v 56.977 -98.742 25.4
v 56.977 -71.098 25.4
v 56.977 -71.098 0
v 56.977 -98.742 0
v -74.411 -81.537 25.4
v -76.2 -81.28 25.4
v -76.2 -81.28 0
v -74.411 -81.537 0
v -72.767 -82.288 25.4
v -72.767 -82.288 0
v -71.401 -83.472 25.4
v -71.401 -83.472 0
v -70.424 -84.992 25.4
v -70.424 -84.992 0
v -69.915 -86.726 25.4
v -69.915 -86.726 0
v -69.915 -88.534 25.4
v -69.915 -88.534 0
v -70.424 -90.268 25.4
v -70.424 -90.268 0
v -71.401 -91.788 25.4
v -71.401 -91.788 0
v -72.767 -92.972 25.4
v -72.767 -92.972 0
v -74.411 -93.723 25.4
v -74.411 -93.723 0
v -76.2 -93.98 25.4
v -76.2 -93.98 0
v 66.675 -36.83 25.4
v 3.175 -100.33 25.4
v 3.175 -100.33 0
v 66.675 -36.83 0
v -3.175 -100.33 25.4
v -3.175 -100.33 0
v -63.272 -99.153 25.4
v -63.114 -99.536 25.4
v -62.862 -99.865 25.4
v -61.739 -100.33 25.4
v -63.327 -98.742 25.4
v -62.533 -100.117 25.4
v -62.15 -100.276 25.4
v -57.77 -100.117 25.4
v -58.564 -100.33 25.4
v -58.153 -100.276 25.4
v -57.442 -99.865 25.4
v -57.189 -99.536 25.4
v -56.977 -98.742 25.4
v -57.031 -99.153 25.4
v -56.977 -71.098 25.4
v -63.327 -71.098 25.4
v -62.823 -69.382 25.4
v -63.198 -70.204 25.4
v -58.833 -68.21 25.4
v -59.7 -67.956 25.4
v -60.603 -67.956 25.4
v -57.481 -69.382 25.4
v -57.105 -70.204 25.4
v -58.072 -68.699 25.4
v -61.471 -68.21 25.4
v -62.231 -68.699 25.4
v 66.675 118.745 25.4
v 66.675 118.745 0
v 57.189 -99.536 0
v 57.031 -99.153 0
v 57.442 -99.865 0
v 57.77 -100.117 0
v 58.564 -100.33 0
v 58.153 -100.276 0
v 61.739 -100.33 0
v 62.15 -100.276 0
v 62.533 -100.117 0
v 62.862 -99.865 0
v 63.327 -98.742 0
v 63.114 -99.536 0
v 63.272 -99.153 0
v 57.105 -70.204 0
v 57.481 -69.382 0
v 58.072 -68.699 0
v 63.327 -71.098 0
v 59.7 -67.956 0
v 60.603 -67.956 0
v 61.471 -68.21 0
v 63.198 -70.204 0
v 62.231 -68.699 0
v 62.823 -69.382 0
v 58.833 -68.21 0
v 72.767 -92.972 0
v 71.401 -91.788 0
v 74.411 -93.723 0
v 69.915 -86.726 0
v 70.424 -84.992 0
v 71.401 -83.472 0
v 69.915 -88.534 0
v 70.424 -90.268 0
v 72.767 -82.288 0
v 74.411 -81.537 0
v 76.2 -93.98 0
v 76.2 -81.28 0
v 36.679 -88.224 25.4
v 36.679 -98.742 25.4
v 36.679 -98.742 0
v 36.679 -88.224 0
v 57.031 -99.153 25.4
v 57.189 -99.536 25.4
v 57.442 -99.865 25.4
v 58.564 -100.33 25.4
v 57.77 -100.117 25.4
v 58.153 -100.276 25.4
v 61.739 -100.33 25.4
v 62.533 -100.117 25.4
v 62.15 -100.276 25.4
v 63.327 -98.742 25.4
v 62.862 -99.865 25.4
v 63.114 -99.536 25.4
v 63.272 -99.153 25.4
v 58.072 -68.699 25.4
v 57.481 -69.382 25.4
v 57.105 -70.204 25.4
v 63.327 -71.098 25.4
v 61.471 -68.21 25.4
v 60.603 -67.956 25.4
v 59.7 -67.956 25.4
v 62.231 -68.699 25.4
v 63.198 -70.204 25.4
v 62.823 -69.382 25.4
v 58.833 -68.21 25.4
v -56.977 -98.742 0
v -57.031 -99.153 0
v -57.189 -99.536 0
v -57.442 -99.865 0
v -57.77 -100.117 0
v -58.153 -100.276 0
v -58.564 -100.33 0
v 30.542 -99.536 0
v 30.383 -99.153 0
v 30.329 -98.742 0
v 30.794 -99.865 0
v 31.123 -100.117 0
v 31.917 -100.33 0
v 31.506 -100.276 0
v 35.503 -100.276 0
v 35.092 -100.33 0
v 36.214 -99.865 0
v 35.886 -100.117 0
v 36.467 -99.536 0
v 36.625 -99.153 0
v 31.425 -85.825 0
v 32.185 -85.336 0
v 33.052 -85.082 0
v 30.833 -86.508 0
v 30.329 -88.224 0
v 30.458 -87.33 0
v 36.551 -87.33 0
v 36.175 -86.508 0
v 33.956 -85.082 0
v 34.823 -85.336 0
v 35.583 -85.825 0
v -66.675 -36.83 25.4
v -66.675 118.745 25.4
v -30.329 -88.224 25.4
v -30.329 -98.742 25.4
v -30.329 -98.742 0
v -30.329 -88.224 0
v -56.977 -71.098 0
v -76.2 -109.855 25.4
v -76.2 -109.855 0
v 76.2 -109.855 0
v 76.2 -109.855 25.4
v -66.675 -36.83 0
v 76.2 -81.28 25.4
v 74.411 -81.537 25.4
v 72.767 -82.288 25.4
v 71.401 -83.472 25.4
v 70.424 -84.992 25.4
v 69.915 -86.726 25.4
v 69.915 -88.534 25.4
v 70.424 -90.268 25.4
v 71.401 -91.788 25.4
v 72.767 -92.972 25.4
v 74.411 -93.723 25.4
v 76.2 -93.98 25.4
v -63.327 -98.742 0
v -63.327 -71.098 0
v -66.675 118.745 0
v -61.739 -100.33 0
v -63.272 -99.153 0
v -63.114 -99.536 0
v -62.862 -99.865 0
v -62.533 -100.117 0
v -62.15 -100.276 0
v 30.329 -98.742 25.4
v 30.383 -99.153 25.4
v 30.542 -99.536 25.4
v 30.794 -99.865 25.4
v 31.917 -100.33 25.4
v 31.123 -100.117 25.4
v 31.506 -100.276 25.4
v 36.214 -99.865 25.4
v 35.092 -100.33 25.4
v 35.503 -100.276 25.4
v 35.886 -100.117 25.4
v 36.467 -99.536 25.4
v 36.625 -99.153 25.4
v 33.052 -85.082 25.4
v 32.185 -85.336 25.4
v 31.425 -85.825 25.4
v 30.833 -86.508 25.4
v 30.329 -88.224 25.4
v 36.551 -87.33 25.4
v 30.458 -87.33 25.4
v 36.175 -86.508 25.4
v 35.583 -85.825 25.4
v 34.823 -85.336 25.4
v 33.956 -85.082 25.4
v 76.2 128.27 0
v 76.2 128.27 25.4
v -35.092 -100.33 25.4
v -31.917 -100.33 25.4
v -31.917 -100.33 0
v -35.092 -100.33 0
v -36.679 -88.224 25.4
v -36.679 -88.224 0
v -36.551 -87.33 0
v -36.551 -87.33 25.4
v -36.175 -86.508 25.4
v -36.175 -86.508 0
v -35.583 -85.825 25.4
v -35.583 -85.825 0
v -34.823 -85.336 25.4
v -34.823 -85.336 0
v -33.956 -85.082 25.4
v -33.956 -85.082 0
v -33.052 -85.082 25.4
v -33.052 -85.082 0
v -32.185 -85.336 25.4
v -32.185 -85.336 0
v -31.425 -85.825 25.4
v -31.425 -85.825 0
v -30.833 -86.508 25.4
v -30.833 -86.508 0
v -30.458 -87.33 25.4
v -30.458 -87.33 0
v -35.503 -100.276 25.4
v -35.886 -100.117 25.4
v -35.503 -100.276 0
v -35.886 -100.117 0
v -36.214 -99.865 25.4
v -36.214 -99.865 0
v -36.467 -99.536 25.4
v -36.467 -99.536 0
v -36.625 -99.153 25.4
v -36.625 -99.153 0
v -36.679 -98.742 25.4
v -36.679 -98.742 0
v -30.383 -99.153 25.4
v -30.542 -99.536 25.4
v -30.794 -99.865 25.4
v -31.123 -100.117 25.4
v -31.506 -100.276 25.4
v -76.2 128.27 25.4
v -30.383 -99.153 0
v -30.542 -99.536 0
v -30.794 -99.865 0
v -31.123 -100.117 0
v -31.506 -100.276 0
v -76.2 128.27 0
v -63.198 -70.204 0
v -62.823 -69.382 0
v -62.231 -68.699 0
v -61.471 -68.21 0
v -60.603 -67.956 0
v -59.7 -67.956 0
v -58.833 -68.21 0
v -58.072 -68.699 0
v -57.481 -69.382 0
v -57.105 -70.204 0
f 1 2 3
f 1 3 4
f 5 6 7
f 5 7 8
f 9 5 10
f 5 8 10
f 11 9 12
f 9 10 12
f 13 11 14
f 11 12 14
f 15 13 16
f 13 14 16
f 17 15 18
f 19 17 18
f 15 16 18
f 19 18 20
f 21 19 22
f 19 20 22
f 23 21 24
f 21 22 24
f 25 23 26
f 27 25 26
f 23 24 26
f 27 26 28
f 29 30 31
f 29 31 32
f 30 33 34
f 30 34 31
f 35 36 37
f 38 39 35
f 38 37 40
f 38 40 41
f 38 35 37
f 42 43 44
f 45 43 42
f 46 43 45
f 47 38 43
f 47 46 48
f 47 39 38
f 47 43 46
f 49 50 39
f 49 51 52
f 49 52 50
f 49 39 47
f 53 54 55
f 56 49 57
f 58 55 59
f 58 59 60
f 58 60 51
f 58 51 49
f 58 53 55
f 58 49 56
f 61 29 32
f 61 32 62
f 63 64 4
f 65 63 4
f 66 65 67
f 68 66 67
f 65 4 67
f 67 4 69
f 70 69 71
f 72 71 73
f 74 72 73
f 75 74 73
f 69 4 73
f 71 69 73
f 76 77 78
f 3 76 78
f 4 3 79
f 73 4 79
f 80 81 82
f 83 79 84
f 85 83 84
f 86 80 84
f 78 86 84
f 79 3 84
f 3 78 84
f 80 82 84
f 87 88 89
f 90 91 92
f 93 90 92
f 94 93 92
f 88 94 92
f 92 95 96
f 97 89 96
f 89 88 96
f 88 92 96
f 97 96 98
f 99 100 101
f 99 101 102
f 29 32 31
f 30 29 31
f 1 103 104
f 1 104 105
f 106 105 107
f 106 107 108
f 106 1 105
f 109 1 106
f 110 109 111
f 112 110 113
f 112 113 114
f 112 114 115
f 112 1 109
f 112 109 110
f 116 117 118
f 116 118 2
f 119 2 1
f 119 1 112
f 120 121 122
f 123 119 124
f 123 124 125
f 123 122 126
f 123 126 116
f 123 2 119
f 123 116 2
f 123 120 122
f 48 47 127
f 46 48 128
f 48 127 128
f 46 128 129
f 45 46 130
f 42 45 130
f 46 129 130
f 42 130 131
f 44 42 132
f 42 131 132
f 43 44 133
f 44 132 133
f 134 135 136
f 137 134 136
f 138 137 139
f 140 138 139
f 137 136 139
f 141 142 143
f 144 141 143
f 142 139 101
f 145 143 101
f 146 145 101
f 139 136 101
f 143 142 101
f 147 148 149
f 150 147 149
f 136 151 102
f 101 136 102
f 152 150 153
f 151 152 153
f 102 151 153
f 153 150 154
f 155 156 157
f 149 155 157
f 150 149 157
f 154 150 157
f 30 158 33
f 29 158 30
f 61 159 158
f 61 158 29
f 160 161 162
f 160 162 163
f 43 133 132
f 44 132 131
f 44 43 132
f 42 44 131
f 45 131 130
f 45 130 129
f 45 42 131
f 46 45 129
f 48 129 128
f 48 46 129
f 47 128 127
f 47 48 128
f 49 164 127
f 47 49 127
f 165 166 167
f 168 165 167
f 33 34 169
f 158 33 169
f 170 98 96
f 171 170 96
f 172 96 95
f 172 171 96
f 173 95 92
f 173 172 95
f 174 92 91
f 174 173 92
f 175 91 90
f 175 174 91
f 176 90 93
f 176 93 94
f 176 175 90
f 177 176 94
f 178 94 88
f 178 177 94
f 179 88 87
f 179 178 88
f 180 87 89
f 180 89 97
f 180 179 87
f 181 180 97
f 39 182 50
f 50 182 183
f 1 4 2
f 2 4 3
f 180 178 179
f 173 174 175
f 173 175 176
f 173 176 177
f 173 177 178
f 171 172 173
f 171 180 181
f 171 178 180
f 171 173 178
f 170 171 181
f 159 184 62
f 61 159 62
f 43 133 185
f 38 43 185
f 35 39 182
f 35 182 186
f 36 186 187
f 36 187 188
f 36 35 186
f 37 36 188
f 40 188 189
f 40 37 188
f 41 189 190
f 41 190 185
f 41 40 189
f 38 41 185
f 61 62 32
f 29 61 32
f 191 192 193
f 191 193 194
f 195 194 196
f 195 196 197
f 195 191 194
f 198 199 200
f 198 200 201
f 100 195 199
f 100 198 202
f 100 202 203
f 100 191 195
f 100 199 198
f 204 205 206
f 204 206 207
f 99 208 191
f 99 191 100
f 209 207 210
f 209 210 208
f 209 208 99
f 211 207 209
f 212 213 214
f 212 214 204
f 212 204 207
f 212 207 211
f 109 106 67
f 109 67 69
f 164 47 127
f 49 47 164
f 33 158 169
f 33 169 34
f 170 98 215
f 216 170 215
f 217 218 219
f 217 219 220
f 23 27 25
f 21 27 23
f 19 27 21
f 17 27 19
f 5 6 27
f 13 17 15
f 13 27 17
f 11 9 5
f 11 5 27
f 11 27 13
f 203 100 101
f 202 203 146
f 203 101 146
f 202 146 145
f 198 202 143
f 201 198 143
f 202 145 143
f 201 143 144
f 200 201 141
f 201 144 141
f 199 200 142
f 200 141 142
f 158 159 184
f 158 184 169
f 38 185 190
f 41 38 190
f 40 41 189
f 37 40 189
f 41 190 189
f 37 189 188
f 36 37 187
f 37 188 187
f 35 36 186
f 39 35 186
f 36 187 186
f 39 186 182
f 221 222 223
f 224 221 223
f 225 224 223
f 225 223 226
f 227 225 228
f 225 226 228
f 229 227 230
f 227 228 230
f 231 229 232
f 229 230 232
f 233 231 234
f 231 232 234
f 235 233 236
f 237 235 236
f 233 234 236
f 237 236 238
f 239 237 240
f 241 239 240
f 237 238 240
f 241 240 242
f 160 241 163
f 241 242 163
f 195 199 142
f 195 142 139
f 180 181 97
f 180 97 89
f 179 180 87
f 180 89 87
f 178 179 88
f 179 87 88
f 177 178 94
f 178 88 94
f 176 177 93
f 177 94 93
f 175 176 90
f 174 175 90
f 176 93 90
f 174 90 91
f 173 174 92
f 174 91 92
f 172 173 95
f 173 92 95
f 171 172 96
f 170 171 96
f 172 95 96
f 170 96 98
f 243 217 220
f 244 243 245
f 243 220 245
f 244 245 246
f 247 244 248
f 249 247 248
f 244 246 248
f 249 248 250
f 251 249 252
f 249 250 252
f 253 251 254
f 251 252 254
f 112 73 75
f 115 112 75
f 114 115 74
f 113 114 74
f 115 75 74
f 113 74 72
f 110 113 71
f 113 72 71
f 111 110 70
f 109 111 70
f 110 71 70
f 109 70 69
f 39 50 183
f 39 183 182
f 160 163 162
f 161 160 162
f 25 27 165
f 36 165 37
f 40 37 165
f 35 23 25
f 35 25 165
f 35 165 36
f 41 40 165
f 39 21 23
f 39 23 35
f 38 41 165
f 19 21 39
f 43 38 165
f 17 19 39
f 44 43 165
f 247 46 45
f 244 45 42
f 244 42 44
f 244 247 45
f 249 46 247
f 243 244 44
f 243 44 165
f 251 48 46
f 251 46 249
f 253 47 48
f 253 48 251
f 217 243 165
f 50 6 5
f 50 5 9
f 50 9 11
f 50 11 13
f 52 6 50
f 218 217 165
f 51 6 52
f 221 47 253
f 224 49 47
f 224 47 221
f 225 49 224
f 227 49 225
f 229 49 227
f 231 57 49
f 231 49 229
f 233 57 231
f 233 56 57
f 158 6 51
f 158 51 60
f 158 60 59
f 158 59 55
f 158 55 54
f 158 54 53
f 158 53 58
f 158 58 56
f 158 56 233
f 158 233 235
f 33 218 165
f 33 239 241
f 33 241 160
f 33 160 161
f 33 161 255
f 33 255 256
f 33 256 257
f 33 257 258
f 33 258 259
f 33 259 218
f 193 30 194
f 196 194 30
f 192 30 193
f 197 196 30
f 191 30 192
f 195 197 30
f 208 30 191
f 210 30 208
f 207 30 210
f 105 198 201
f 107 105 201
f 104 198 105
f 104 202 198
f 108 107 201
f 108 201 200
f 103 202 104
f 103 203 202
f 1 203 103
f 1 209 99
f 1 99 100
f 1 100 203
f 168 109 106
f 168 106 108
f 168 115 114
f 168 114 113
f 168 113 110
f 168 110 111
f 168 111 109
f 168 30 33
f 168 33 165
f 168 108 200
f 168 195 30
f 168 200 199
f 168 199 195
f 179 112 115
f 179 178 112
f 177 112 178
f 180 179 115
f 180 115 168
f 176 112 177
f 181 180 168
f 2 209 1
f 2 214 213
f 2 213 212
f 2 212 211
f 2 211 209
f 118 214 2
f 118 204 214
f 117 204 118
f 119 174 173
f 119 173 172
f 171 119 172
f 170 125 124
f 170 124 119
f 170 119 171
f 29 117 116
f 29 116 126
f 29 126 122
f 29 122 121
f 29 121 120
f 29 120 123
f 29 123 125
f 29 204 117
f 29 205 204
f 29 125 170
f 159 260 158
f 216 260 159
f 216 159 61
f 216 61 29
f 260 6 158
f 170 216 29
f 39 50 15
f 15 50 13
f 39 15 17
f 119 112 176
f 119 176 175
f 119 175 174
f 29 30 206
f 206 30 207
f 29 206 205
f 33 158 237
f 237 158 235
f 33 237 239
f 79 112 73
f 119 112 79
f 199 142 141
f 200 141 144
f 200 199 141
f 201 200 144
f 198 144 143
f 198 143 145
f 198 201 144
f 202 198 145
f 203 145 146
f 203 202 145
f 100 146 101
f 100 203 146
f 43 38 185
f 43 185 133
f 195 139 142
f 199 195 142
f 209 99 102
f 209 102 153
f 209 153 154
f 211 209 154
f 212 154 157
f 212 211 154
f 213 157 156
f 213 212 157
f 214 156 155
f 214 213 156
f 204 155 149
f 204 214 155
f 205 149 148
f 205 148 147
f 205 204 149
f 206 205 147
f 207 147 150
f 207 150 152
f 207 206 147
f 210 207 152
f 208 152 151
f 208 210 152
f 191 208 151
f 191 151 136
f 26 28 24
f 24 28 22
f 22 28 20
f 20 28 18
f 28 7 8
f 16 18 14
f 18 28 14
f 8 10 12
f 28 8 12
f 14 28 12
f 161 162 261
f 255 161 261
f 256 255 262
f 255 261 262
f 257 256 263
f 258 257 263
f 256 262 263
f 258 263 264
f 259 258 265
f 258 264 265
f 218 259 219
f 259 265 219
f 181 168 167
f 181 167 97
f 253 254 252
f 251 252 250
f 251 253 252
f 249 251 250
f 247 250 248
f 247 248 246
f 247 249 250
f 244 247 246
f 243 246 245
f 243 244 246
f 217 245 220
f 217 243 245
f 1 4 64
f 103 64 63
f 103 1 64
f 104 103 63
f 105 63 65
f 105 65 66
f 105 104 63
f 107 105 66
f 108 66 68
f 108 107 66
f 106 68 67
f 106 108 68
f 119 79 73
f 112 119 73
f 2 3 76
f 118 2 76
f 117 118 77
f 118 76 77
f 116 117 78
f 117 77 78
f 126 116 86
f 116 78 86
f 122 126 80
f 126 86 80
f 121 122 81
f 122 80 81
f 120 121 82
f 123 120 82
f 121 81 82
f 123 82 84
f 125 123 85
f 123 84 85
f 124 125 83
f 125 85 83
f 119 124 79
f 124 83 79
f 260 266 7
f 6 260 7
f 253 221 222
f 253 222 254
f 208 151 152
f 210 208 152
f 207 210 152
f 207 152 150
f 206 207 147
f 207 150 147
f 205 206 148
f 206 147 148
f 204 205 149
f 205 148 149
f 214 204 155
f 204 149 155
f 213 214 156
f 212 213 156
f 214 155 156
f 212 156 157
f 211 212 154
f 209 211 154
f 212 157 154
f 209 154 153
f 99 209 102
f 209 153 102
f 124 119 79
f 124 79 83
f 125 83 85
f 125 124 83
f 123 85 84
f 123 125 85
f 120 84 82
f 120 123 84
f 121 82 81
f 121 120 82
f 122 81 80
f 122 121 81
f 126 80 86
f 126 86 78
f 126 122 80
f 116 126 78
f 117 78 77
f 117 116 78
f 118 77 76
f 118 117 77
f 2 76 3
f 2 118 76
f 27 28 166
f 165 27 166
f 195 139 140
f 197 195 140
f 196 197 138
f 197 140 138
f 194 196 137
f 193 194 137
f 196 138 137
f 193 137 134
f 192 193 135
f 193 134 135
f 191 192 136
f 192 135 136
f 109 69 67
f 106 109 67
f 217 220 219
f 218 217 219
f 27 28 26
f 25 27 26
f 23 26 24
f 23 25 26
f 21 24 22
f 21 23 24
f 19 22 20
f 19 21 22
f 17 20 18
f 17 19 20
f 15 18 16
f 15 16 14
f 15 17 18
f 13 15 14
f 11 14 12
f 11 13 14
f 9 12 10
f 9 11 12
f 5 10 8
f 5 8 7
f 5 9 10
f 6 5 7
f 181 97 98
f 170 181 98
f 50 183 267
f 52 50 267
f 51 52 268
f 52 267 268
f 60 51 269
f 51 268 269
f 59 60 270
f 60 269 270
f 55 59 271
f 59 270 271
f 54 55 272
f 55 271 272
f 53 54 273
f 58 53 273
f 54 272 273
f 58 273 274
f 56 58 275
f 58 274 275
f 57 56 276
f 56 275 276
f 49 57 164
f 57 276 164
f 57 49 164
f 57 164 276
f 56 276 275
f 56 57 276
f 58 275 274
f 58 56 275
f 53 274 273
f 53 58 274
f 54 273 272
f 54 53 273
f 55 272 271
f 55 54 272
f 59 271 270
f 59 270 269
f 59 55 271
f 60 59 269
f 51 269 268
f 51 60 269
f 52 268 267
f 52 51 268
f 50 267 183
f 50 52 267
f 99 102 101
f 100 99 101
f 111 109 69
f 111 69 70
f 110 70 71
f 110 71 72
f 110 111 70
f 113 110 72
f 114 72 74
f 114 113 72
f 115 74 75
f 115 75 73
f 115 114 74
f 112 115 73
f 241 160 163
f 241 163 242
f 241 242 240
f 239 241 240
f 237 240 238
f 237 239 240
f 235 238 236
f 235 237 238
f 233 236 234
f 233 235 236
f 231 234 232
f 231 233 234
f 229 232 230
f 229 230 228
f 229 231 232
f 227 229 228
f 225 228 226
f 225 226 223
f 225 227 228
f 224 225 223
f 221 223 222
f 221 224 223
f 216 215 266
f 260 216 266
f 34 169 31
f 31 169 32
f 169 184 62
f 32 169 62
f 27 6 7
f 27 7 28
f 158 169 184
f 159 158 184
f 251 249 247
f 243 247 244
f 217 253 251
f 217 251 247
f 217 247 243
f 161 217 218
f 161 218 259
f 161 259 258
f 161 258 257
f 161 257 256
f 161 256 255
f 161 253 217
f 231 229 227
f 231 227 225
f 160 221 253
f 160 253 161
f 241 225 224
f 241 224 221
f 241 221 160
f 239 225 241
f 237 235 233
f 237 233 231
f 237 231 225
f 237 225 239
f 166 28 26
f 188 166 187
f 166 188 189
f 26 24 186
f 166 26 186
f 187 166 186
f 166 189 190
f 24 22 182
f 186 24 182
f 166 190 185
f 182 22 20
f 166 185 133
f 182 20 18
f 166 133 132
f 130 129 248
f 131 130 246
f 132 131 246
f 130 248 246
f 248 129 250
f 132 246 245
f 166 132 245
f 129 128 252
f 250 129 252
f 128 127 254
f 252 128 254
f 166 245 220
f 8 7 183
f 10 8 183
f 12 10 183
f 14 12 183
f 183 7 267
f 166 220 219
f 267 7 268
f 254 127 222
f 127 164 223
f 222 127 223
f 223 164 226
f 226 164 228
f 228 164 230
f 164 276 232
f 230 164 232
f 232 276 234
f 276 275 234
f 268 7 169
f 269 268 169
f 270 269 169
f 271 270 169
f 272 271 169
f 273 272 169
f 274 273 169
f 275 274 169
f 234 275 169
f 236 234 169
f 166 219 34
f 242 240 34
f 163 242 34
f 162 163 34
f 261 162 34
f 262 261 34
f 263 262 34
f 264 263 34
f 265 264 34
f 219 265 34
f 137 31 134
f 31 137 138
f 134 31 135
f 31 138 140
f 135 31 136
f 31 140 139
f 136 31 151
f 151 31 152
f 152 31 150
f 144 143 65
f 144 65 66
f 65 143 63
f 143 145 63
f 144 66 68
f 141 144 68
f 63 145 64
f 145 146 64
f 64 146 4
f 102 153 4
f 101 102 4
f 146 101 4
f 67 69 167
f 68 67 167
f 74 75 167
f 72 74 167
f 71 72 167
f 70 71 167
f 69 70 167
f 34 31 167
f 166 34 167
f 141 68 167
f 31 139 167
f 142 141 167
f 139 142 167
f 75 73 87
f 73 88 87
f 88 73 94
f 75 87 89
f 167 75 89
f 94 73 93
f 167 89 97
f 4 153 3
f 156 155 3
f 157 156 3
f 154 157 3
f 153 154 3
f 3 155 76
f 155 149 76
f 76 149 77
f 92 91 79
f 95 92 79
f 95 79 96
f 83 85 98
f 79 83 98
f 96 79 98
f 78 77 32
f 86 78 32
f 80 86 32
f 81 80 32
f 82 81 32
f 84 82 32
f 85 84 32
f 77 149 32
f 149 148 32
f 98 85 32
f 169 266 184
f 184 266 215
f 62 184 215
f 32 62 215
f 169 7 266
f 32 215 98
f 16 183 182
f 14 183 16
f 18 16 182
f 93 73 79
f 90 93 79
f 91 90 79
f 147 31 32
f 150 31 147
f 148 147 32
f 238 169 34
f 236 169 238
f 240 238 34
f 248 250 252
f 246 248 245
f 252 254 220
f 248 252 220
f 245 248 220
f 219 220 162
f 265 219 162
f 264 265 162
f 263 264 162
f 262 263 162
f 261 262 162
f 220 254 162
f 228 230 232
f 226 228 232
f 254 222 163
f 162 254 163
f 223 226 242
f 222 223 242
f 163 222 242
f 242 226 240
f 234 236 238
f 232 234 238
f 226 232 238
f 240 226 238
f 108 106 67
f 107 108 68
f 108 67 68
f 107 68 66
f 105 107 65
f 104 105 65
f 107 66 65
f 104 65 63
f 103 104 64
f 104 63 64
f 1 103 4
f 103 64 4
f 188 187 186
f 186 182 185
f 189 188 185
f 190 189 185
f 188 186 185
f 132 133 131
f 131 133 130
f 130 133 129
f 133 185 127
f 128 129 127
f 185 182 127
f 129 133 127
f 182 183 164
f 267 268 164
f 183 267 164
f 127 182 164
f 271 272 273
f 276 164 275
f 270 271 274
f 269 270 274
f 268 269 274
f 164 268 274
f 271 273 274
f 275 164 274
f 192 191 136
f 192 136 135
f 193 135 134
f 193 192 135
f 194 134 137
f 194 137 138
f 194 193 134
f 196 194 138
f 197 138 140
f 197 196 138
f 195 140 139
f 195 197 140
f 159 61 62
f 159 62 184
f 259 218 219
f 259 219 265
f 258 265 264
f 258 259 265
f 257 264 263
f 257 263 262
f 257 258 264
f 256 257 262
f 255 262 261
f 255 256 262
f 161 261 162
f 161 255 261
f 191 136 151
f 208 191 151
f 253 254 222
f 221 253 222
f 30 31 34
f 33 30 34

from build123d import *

# Parameters (mm, degrees)
F1_DEPTH = 25.4
F3_DEPTH = 25.4


with BuildPart() as f1:
    # F0 (on Top) → F1 (new body)
    with BuildSketch(Plane.XY):
        with BuildLine():
            Line((76.2, 128.27), (-76.2, 128.27))
            Line((-76.2, 128.27), (-76.2, -81.28))
            ThreePointArc((-76.2, -81.28), (-69.85, -87.63), (-76.2, -93.98))
            Line((-76.2, -93.98), (-76.2, -109.855))
            Line((-76.2, -109.855), (76.2, -109.855))
            Line((76.2, -109.855), (76.2, -93.98))
            ThreePointArc((76.2, -93.98), (69.85, -87.63), (76.2, -81.28))
            Line((76.2, -81.28), (76.2, 128.27))
        make_face()
        with BuildLine():
            Line((-56.9765769958, -71.0984617472), (-56.9765769958, -98.7425))
            ThreePointArc((-56.9765769958, -98.7425), (-57.4415449807, -99.8650320151), (-58.5640769958, -100.33))
            Line((-58.5640769958, -100.33), (-61.7390769958, -100.33))
            ThreePointArc((-61.7390769958, -100.33), (-62.861609011, -99.8650320151), (-63.3265769958, -98.7425))
            Line((-63.3265769958, -98.7425), (-63.3265769958, -71.0984617472))
            ThreePointArc((-63.3265769958, -71.0984617472), (-60.1515769958, -67.9234617472), (-56.9765769958, -71.0984617472))
        make_face(mode=Mode.SUBTRACT)
        with BuildLine():
            Line((-30.3292849183, -88.2243067026), (-30.3292849183, -98.7425))
            ThreePointArc((-30.3292849183, -98.7425), (-30.7942529032, -99.8650320151), (-31.9167849183, -100.33))
            Line((-31.9167849183, -100.33), (-35.0917849183, -100.33))
            ThreePointArc((-35.0917849183, -100.33), (-36.2143169334, -99.8650320151), (-36.6792849183, -98.7425))
            Line((-36.6792849183, -98.7425), (-36.6792849183, -88.2243067026))
            ThreePointArc((-36.6792849183, -88.2243067026), (-33.5042849183, -85.0493067026), (-30.3292849183, -88.2243067026))
        make_face(mode=Mode.SUBTRACT)
        with BuildLine():
            Line((36.6792849183, -88.2243067026), (36.6792849183, -98.7425))
            ThreePointArc((36.6792849183, -98.7425), (36.2143169334, -99.8650320151), (35.0917849183, -100.33))
            Line((35.0917849183, -100.33), (31.9167849183, -100.33))
            ThreePointArc((31.9167849183, -100.33), (30.7942529032, -99.8650320151), (30.3292849183, -98.7425))
            Line((30.3292849183, -98.7425), (30.3292849183, -88.2243067026))
            ThreePointArc((30.3292849183, -88.2243067026), (33.5042849183, -85.0493067026), (36.6792849183, -88.2243067026))
        make_face(mode=Mode.SUBTRACT)
        with BuildLine():
            ThreePointArc((58.5640769958, -100.33), (57.4415449807, -99.8650320151), (56.9765769958, -98.7425))
            Line((56.9765769958, -98.7425), (56.9765769958, -71.0984617472))
            ThreePointArc((56.9765769958, -71.0984617472), (60.1515769958, -67.9234617472), (63.3265769958, -71.0984617472))
            Line((63.3265769958, -71.0984617472), (63.3265769958, -98.7425))
            ThreePointArc((63.3265769958, -98.7425), (62.861609011, -99.8650320151), (61.7390769958, -100.33))
            Line((61.7390769958, -100.33), (58.5640769958, -100.33))
        make_face(mode=Mode.SUBTRACT)
        Polygon((-66.675, 118.745), (66.675, 118.745), (66.675, -36.83), (3.175, -100.33), (0, -100.33), (-3.175, -100.33), (-66.675, -36.83), align=None, mode=Mode.SUBTRACT)
    extrude(amount=F1_DEPTH)


with BuildPart() as f3:
    # F2 (on face) → F3 (new body)
    with BuildSketch(Plane.XY.offset(25.4)):
        Polygon((-66.675, -36.83), (-3.175, -100.33), (3.175, -100.33), (66.675, -36.83), (66.675, 118.745), (-66.675, 118.745), align=None)
    extrude(amount=-F3_DEPTH)


with BuildPart() as f3b:
    # F2 (on face) → F3, piece 2 (new body)
    with BuildSketch(Plane.XY.offset(25.4)):
        with BuildLine():
            Line((-63.3265769958, -71.0984617472), (-63.3265769958, -98.7425))
            ThreePointArc((-63.3265769958, -98.7425), (-62.861609011, -99.8650320151), (-61.7390769958, -100.33))
            Line((-61.7390769958, -100.33), (-58.5640769958, -100.33))
            ThreePointArc((-58.5640769958, -100.33), (-57.4415449807, -99.8650320151), (-56.9765769958, -98.7425))
            Line((-56.9765769958, -98.7425), (-56.9765769958, -71.0984617472))
            ThreePointArc((-56.9765769958, -71.0984617472), (-60.1515769958, -67.9234617472), (-63.3265769958, -71.0984617472))
        make_face()
    extrude(amount=-F3_DEPTH)


with BuildPart() as f3c:
    # F2 (on face) → F3, piece 3 (new body)
    with BuildSketch(Plane.XY.offset(25.4)):
        with BuildLine():
            Line((-76.2, -81.28), (-76.2, -93.98))
            ThreePointArc((-76.2, -93.98), (-69.85, -87.63), (-76.2, -81.28))
        make_face()
    extrude(amount=-F3_DEPTH)


with BuildPart() as f3d:
    # F2 (on face) → F3, piece 4 (new body)
    with BuildSketch(Plane.XY.offset(25.4)):
        with BuildLine():
            Line((-36.6792849183, -88.2243067026), (-36.6792849183, -98.7425))
            ThreePointArc((-36.6792849183, -98.7425), (-36.2143169334, -99.8650320151), (-35.0917849183, -100.33))
            Line((-35.0917849183, -100.33), (-31.9167849183, -100.33))
            ThreePointArc((-31.9167849183, -100.33), (-30.7942529032, -99.8650320151), (-30.3292849183, -98.7425))
            Line((-30.3292849183, -98.7425), (-30.3292849183, -88.2243067026))
            ThreePointArc((-30.3292849183, -88.2243067026), (-33.5042849183, -85.0493067026), (-36.6792849183, -88.2243067026))
        make_face()
    extrude(amount=-F3_DEPTH)


with BuildPart() as f3e:
    # F2 (on face) → F3, piece 5 (new body)
    with BuildSketch(Plane.XY.offset(25.4)):
        with BuildLine():
            Line((30.3292849183, -88.2243067026), (30.3292849183, -98.7425))
            ThreePointArc((30.3292849183, -98.7425), (30.7942529032, -99.8650320151), (31.9167849183, -100.33))
            Line((31.9167849183, -100.33), (35.0917849183, -100.33))
            ThreePointArc((35.0917849183, -100.33), (36.2143169334, -99.8650320151), (36.6792849183, -98.7425))
            Line((36.6792849183, -98.7425), (36.6792849183, -88.2243067026))
            ThreePointArc((36.6792849183, -88.2243067026), (33.5042849183, -85.0493067026), (30.3292849183, -88.2243067026))
        make_face()
    extrude(amount=-F3_DEPTH)


with BuildPart() as f3f:
    # F2 (on face) → F3, piece 6 (new body)
    with BuildSketch(Plane.XY.offset(25.4)):
        with BuildLine():
            ThreePointArc((61.7390769958, -100.33), (62.861609011, -99.8650320151), (63.3265769958, -98.7425))
            Line((63.3265769958, -98.7425), (63.3265769958, -71.0984617472))
            ThreePointArc((63.3265769958, -71.0984617472), (60.1515769958, -67.9234617472), (56.9765769958, -71.0984617472))
            Line((56.9765769958, -71.0984617472), (56.9765769958, -98.7425))
            ThreePointArc((56.9765769958, -98.7425), (57.4415449807, -99.8650320151), (58.5640769958, -100.33))
            Line((58.5640769958, -100.33), (61.7390769958, -100.33))
        make_face()
    extrude(amount=-F3_DEPTH)


with BuildPart() as f3g:
    # F2 (on face) → F3, piece 7 (new body)
    with BuildSketch(Plane.XY.offset(25.4)):
        with BuildLine():
            ThreePointArc((76.2, -81.28), (69.85, -87.63), (76.2, -93.98))
            Line((76.2, -93.98), (76.2, -81.28))
        make_face()
    extrude(amount=-F3_DEPTH)


solid = Compound([f1.part, f3.part, f3b.part, f3c.part, f3d.part, f3e.part, f3f.part, f3g.part])
